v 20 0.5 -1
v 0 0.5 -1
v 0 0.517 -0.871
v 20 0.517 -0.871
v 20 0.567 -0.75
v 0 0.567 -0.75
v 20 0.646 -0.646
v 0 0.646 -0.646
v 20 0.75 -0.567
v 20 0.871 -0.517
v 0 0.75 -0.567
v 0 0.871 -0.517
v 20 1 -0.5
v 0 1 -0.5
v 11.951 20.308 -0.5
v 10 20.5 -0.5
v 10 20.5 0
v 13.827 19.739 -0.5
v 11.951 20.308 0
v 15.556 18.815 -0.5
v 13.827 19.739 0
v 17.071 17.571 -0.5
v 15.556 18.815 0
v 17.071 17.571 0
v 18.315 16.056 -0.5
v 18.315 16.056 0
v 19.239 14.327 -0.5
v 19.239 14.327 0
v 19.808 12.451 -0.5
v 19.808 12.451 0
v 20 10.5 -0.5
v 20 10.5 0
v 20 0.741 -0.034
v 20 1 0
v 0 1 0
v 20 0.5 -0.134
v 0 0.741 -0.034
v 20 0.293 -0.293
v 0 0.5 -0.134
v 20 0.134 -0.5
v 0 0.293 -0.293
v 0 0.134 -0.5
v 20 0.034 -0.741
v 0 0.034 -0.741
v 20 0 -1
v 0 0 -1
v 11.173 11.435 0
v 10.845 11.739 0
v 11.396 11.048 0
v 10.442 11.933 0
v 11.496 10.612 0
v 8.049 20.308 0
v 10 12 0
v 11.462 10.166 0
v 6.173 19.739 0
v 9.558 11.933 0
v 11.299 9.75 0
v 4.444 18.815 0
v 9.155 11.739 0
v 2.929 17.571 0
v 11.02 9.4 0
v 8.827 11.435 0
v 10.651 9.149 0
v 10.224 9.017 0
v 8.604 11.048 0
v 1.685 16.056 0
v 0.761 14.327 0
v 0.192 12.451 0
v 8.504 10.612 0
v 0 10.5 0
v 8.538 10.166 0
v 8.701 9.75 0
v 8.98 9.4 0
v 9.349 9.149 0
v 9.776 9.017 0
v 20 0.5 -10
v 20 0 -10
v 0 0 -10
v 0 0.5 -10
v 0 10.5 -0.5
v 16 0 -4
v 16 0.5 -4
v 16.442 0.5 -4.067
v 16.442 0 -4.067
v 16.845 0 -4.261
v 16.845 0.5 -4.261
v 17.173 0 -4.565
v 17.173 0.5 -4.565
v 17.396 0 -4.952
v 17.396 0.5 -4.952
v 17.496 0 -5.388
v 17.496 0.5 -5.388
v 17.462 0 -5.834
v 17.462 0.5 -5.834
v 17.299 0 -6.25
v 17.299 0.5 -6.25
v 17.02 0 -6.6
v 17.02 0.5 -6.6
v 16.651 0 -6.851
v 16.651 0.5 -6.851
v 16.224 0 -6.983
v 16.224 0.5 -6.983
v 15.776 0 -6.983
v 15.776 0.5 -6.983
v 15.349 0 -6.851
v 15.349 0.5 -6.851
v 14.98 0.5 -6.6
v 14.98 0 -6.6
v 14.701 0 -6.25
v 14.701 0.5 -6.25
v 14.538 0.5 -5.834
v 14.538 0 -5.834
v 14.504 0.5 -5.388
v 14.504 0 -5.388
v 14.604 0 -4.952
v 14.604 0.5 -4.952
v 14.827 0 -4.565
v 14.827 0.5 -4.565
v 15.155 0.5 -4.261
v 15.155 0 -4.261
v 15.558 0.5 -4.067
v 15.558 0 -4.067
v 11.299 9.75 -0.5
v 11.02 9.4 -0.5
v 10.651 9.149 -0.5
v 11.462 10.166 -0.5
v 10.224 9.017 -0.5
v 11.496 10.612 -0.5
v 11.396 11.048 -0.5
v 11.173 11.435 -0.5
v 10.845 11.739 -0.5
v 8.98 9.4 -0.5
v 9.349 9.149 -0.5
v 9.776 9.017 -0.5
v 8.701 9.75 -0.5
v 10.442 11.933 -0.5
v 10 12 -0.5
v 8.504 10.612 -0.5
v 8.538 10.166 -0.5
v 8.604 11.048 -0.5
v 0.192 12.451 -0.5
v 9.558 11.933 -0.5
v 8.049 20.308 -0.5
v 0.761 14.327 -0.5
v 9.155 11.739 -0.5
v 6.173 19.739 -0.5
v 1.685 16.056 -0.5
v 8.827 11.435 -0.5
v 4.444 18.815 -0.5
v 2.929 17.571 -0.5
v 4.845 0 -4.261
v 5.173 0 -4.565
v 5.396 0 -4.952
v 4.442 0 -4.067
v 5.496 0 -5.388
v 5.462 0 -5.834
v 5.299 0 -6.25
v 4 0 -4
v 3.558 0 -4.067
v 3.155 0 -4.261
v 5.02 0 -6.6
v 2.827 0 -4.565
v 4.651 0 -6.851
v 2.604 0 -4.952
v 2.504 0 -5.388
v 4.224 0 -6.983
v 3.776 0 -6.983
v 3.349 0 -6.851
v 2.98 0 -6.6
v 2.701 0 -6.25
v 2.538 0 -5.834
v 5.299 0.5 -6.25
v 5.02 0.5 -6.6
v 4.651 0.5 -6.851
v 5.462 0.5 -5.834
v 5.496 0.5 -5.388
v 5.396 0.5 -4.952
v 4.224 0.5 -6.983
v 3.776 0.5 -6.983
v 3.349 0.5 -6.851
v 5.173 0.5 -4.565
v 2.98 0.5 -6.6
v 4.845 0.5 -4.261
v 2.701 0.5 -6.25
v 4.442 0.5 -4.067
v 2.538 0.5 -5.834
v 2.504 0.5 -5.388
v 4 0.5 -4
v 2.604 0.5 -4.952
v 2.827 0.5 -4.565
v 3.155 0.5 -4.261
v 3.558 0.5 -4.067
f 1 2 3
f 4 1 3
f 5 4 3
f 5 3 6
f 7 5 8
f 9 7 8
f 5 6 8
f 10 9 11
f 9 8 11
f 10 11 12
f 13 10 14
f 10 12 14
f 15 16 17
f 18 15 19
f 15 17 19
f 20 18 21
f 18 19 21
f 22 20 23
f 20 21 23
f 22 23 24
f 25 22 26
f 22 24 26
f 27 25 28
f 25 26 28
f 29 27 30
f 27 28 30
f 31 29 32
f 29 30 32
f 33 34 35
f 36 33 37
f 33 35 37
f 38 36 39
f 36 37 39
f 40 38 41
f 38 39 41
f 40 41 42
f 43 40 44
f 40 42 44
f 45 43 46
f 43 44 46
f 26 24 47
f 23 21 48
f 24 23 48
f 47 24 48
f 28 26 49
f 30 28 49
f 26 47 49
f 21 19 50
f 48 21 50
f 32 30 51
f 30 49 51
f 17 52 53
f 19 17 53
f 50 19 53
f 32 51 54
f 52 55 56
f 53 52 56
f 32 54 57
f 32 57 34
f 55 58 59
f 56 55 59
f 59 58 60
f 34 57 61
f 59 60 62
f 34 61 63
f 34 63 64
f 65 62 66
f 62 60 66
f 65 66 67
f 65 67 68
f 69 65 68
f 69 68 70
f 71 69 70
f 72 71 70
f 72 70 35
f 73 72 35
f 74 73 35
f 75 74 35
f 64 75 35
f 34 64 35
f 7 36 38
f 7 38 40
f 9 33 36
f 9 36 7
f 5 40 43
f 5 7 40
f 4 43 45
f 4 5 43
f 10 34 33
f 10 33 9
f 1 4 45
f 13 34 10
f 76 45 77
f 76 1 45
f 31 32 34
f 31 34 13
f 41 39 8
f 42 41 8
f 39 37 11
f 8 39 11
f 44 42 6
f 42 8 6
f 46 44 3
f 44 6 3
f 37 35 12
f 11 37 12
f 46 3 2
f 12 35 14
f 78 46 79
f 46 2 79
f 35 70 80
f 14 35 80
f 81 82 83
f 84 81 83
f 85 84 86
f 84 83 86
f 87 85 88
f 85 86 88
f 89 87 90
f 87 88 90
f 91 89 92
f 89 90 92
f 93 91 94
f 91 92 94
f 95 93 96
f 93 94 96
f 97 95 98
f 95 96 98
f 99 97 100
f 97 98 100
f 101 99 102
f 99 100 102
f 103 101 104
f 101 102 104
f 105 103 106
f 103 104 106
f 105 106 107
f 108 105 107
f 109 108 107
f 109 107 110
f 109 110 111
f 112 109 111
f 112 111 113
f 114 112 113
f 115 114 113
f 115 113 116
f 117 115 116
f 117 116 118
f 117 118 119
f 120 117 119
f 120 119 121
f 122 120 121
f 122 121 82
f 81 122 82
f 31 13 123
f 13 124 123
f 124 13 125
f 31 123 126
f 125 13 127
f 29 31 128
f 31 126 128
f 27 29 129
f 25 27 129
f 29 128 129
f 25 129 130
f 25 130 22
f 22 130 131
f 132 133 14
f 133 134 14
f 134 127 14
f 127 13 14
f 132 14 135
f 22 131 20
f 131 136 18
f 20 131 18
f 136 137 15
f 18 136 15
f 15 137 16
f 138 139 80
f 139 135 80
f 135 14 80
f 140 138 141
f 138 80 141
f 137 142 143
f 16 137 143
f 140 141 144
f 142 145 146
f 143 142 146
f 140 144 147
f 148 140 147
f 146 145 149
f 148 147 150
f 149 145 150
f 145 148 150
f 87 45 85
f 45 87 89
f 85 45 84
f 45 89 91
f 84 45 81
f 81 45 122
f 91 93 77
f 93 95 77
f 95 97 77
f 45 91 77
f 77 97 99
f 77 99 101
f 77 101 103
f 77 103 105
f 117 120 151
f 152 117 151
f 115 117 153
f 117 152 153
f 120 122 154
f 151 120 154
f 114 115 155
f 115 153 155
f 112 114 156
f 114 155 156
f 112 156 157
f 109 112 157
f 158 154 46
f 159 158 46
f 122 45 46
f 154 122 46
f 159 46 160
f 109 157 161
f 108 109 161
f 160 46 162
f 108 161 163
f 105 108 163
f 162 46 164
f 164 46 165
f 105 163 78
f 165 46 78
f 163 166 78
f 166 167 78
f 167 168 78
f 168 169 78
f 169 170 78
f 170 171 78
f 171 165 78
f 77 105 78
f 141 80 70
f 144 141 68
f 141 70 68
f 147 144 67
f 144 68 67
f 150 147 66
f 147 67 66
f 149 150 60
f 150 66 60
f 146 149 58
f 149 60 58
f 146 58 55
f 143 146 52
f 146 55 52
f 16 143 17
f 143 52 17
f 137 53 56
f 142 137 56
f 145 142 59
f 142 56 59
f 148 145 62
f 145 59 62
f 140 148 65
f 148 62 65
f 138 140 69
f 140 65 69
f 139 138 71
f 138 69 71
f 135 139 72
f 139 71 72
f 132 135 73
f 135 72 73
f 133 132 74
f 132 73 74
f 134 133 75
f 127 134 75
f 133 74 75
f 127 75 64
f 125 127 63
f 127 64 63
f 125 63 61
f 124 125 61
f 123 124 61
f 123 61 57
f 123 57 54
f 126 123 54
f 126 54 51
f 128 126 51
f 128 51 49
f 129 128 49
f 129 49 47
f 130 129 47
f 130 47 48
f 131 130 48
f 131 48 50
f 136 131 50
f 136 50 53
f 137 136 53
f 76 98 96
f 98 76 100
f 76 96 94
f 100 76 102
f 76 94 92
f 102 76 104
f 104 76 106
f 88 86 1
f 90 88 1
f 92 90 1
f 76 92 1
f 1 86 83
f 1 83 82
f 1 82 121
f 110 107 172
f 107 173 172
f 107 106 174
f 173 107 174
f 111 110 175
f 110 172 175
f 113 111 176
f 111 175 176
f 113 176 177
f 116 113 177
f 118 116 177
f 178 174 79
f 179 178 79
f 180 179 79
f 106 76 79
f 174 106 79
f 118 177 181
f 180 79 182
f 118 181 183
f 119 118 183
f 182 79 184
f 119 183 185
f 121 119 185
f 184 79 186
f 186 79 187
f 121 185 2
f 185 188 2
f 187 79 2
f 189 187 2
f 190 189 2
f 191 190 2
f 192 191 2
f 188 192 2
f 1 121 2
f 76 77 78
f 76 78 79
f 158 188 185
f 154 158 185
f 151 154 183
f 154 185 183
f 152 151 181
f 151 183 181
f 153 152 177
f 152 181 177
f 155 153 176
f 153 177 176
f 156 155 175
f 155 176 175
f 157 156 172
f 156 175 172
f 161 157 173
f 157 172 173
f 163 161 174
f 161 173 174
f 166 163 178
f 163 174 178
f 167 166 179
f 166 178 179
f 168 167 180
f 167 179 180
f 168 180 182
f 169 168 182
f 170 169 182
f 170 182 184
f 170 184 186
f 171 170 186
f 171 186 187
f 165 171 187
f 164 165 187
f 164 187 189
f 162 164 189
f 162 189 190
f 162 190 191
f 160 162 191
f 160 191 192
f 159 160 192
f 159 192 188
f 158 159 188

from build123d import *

# Parameters (mm, degrees)
BRIDA_BASE1_DEPTH     = 20
CROQUIS5_R            = 1.5
CORTAR_EXTRUIR1_DEPTH = 10
CROQUIS6_R            = 1.5
CORTAR_EXTRUIR2_DEPTH = 10


# Sheet-metal steps are written as plain solids
with BuildPart() as part:
    # Croquis1 → Brida base1 (new body)
    with BuildSketch(Plane(origin=(0, 0, 0), x_dir=(0, 0, -1), z_dir=(1, 0, 0))):
        with BuildLine():
            Line((0, 20.5), (0, 1))
            ThreePointArc((0, 1), (0.292893219, 0.292893219), (1, 0))
            Line((1, 0), (10, 0))
            Line((10, 0), (10, 0.5))
            Line((10, 0.5), (1, 0.5))
            ThreePointArc((1, 0.5), (0.646446609, 0.646446609), (0.5, 1))
            Line((0.5, 1), (0.5, 20.5))
            Line((0.5, 20.5), (0, 20.5))
        make_face()
    extrude(amount=BRIDA_BASE1_DEPTH)

    # Croquis5 → Cortar-Extruir1 (cut)
    with BuildSketch(Plane(origin=(0, 0.5, 0), x_dir=(1, 0, 0), z_dir=(0, 1, 0))):
        with Locations(Location((4, 5.5, 0), (0, 0, 270))):
            Circle(CROQUIS5_R)
        with Locations(Location((16, 5.5, 0), (0, 0, 270))):
            Circle(CROQUIS5_R)
    extrude(amount=-CORTAR_EXTRUIR1_DEPTH, mode=Mode.SUBTRACT)

    # Croquis6 → Cortar-Extruir2 (cut)
    with BuildSketch(Plane.XY):
        with BuildLine():
            ThreePointArc((0, 10.5), (2.928932188, 17.571067812), (10, 20.5))
            Line((10, 20.5), (0, 20.5))
            Line((0, 20.5), (0, 10.5))
        make_face()
        with BuildLine():
            ThreePointArc((10, 20.5), (17.071067812, 17.571067812), (20, 10.5))
            Line((20, 10.5), (20, 20.5))
            Line((20, 20.5), (10, 20.5))
        make_face()
        with Locations(Location((10, 10.5, 0), (0, 0, 90))):
            Circle(CROQUIS6_R)
    extrude(amount=-CORTAR_EXTRUIR2_DEPTH, mode=Mode.SUBTRACT)


solid = part.part
